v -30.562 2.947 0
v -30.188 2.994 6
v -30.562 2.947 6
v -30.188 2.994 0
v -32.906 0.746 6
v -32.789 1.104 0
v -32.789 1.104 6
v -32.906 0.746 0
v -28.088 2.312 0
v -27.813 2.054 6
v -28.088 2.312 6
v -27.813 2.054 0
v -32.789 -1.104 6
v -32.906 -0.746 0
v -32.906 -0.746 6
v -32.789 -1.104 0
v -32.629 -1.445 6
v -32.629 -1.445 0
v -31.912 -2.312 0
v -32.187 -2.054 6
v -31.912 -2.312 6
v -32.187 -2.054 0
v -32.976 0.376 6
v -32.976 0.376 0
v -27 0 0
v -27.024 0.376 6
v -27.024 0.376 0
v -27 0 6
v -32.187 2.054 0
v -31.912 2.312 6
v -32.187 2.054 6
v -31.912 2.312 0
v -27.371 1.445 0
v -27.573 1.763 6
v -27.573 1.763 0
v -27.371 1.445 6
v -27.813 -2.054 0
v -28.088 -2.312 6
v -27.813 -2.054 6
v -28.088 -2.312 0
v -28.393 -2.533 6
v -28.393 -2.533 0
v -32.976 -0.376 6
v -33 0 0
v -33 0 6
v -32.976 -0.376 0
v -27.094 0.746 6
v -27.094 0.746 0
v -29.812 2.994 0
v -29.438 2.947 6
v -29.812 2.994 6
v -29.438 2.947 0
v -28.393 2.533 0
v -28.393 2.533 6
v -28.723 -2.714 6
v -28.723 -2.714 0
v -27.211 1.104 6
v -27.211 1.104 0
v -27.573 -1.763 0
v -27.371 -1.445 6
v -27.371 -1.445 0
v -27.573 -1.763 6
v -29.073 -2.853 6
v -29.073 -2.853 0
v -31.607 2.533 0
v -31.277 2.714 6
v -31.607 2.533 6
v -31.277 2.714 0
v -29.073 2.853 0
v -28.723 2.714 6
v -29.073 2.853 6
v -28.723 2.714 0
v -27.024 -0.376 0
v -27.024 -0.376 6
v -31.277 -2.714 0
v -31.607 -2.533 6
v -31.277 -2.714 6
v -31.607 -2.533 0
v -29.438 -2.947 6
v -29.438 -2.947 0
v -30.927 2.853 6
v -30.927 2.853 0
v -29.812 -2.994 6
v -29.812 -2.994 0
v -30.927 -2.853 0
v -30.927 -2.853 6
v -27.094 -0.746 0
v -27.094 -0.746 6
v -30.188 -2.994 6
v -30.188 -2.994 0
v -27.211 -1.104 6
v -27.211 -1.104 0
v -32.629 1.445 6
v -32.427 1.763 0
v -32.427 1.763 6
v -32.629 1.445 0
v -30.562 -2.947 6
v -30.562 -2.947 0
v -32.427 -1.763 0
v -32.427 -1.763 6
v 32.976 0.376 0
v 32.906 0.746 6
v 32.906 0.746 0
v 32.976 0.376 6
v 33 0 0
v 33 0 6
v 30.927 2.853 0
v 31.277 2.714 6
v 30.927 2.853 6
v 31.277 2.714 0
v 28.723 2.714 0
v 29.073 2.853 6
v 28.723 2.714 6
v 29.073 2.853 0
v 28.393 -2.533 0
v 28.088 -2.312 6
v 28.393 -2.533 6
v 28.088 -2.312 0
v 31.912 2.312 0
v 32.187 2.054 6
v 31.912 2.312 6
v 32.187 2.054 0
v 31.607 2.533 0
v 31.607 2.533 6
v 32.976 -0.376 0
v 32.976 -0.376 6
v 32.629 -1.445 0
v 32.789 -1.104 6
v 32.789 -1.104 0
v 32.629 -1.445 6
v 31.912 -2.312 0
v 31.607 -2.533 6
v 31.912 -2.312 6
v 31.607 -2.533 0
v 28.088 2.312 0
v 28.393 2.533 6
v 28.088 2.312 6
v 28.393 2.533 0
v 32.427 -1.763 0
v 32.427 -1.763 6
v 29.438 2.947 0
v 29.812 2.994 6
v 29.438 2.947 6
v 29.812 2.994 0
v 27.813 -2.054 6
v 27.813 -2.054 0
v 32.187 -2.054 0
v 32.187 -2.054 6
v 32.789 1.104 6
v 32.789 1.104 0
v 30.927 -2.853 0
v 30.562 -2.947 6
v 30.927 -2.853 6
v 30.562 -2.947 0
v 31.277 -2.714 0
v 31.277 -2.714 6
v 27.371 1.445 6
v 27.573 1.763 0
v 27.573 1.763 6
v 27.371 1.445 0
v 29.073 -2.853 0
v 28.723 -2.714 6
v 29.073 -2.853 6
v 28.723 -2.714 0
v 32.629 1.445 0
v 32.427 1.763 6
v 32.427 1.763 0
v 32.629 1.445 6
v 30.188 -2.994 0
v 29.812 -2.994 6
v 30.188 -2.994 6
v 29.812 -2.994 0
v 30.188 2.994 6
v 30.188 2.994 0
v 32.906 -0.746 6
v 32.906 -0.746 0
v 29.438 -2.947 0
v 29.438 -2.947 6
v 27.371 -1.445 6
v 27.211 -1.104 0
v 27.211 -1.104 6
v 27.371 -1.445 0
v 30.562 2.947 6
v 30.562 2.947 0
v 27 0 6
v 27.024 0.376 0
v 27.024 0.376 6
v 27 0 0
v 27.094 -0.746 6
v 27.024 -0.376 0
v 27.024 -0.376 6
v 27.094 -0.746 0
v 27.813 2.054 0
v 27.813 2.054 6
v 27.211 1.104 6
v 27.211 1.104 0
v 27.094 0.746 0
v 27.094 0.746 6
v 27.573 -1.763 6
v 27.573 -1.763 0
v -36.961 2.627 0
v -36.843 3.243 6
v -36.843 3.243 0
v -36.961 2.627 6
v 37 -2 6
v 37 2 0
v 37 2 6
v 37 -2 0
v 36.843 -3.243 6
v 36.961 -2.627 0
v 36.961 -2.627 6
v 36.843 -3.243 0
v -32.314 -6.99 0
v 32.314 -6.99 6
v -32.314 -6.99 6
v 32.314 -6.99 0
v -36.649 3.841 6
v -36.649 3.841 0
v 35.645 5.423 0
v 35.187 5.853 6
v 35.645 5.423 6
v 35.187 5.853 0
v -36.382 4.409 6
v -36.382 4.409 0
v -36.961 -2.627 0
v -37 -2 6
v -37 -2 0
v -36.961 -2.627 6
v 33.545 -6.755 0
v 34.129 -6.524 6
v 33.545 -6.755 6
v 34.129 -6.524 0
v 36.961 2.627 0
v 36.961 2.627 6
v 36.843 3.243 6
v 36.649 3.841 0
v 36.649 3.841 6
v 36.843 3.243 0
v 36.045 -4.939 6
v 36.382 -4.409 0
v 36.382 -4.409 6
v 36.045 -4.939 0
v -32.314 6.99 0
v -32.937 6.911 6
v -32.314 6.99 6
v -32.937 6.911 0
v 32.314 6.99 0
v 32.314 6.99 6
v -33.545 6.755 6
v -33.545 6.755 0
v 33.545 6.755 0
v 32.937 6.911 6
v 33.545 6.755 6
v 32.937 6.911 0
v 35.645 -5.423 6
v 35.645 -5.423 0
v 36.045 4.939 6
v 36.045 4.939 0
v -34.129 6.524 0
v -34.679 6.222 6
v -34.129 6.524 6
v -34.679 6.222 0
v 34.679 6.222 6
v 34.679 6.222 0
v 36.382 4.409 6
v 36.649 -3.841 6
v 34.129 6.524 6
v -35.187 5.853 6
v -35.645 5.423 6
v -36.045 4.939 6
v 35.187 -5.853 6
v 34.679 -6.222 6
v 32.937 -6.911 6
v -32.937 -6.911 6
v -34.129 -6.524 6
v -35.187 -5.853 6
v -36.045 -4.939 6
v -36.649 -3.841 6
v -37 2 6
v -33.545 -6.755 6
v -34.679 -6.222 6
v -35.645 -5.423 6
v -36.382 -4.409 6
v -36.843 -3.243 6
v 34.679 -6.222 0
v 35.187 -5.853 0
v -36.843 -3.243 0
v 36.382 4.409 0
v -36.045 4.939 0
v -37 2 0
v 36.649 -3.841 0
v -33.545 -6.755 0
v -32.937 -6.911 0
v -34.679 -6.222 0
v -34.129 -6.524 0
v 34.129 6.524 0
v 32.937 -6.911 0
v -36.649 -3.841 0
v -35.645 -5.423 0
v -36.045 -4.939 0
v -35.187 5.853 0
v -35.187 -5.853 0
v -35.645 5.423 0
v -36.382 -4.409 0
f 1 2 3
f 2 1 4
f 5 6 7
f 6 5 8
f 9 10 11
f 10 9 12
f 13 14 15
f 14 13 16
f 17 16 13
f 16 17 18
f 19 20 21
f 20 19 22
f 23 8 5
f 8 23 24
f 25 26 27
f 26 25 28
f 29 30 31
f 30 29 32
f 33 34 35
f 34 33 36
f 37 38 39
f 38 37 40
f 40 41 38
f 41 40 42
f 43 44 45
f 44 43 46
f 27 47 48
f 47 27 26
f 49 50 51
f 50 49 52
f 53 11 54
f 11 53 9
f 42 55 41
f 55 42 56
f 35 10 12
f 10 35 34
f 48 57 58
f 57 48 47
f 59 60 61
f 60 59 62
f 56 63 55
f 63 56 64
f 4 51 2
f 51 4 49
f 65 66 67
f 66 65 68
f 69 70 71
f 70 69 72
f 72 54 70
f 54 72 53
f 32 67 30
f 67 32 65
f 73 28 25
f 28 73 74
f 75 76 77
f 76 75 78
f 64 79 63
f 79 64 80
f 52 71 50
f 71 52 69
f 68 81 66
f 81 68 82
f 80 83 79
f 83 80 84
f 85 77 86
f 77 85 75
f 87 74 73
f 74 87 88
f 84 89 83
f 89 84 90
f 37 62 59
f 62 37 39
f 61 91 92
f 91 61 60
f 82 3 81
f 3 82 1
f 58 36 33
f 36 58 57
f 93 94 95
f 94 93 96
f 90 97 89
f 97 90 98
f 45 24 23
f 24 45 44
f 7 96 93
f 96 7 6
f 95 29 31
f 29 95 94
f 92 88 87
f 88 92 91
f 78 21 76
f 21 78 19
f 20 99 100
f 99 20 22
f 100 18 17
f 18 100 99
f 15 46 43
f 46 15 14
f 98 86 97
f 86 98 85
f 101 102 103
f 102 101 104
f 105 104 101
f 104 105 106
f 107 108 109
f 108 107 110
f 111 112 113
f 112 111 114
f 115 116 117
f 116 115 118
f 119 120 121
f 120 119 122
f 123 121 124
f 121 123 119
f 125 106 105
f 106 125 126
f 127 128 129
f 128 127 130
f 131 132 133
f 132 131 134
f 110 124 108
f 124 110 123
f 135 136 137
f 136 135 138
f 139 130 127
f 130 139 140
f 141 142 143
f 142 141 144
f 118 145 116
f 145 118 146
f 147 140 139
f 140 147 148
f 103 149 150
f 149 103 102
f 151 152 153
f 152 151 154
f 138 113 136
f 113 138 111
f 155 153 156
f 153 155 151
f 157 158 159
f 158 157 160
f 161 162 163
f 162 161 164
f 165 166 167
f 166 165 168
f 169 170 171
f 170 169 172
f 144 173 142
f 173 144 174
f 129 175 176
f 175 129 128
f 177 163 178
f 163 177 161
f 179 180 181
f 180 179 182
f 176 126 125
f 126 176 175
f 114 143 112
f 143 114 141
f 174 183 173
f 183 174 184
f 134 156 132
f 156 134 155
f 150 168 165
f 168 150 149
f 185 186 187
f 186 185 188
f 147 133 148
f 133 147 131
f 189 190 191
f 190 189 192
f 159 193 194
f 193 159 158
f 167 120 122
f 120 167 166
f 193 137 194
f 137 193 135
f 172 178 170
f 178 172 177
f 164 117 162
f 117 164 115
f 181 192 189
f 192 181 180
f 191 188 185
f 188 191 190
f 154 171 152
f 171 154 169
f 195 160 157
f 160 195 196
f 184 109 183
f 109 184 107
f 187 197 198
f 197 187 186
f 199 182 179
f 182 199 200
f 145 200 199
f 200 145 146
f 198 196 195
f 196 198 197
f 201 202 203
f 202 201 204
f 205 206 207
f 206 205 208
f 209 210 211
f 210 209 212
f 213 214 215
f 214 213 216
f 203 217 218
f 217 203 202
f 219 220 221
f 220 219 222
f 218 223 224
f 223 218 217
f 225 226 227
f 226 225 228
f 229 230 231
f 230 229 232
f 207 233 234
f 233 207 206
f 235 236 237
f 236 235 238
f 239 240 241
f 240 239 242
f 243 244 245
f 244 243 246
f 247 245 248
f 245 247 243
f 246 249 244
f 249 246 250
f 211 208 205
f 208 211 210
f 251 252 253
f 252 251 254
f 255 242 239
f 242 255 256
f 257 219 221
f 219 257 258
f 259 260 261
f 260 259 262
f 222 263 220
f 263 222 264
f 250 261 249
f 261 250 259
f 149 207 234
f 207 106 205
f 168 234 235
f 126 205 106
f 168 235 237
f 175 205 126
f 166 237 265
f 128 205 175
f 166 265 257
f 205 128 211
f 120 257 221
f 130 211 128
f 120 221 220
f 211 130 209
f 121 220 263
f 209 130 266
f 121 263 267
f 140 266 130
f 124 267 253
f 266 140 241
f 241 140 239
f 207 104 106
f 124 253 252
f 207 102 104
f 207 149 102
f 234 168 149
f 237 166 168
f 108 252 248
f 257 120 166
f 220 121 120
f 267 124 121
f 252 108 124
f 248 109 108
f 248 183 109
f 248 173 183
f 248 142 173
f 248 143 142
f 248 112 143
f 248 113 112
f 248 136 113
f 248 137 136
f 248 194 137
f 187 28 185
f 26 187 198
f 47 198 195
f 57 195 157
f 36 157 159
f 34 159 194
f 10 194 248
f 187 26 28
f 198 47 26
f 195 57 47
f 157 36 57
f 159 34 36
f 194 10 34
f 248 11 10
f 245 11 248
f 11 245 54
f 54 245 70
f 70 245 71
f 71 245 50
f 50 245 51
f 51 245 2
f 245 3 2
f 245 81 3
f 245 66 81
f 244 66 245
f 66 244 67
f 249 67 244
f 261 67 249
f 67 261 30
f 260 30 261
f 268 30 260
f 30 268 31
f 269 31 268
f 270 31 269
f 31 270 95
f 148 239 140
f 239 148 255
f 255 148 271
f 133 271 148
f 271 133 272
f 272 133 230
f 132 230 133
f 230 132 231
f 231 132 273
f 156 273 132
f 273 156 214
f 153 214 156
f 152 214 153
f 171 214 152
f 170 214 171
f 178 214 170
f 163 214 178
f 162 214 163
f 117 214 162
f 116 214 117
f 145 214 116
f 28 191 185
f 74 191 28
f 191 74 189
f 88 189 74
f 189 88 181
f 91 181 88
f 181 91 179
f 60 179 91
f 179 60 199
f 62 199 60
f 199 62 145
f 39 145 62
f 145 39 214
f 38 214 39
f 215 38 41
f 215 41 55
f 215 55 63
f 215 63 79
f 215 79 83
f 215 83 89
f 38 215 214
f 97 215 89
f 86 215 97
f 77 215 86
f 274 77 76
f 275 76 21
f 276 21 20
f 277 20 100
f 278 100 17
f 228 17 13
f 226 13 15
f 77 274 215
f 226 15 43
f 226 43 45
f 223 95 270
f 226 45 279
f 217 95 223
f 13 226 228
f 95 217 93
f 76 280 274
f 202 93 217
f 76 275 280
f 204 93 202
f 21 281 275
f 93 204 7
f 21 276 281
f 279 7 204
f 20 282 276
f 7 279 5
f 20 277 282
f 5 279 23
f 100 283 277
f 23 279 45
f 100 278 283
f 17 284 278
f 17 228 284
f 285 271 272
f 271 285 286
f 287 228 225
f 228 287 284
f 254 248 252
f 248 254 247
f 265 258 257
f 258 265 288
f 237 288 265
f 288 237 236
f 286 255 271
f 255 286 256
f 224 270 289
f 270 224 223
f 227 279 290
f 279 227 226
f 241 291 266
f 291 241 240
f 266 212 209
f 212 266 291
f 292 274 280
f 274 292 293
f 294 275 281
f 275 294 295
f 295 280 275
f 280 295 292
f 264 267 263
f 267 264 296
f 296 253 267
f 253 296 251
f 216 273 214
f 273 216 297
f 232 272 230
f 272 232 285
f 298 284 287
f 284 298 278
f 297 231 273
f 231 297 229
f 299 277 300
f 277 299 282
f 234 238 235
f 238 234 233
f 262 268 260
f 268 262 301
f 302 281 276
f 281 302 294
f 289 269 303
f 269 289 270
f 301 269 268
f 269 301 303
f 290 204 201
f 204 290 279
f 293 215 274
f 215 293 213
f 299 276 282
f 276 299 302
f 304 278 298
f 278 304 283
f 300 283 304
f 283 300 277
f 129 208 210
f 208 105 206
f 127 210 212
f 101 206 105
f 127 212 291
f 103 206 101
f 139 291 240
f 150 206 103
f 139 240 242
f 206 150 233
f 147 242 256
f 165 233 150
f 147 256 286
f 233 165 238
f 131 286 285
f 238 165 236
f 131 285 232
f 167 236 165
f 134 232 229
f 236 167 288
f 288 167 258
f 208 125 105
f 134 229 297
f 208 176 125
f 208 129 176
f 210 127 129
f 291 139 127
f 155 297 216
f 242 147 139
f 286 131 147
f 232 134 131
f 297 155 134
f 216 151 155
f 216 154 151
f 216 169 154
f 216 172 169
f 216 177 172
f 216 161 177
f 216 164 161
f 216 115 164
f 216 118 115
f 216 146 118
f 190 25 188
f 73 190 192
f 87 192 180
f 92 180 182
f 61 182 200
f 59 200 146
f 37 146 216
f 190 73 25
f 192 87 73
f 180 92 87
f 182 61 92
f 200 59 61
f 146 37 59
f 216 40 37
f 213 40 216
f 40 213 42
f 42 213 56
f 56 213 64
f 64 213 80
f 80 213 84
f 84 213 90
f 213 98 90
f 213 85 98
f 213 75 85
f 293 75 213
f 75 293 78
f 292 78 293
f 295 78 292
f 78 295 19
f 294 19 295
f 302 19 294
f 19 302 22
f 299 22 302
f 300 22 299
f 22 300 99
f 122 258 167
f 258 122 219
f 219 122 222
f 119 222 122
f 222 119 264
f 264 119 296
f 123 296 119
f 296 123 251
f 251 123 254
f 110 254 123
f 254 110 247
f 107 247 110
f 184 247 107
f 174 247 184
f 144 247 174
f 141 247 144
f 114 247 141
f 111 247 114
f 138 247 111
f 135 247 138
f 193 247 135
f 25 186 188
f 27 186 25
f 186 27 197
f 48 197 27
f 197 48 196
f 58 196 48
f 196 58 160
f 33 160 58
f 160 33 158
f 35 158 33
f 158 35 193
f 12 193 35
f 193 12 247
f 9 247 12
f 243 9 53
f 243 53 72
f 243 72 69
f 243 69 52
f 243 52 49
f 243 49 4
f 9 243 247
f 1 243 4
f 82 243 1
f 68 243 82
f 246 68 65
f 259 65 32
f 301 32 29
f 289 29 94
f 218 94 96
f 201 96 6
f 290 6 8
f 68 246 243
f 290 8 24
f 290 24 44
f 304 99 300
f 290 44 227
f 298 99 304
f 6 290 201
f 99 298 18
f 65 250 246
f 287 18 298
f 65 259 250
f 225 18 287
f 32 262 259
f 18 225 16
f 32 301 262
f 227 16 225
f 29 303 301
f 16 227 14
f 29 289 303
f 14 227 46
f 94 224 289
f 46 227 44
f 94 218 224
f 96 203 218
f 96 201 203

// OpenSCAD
$fn = 50;


difference() {
	union() {
		hull() {
			translate(v = [-32.0000000000, 2.0000000000, 0]) {
				cylinder(h = 6, r = 5);
			}
			translate(v = [32.0000000000, 2.0000000000, 0]) {
				cylinder(h = 6, r = 5);
			}
			translate(v = [-32.0000000000, -2.0000000000, 0]) {
				cylinder(h = 6, r = 5);
			}
			translate(v = [32.0000000000, -2.0000000000, 0]) {
				cylinder(h = 6, r = 5);
			}
		}
	}
	union() {
		translate(v = [-30.0000000000, 0.0000000000, -100.0000000000]) {
			cylinder(h = 200, r = 3.0000000000);
		}
		translate(v = [-30.0000000000, 0.0000000000, -100.0000000000]) {
			cylinder(h = 200, r = 3.0000000000);
		}
		translate(v = [30.0000000000, 0.0000000000, -100.0000000000]) {
			cylinder(h = 200, r = 3.0000000000);
		}
		translate(v = [30.0000000000, 0.0000000000, -100.0000000000]) {
			cylinder(h = 200, r = 3.0000000000);
		}
	}
}
